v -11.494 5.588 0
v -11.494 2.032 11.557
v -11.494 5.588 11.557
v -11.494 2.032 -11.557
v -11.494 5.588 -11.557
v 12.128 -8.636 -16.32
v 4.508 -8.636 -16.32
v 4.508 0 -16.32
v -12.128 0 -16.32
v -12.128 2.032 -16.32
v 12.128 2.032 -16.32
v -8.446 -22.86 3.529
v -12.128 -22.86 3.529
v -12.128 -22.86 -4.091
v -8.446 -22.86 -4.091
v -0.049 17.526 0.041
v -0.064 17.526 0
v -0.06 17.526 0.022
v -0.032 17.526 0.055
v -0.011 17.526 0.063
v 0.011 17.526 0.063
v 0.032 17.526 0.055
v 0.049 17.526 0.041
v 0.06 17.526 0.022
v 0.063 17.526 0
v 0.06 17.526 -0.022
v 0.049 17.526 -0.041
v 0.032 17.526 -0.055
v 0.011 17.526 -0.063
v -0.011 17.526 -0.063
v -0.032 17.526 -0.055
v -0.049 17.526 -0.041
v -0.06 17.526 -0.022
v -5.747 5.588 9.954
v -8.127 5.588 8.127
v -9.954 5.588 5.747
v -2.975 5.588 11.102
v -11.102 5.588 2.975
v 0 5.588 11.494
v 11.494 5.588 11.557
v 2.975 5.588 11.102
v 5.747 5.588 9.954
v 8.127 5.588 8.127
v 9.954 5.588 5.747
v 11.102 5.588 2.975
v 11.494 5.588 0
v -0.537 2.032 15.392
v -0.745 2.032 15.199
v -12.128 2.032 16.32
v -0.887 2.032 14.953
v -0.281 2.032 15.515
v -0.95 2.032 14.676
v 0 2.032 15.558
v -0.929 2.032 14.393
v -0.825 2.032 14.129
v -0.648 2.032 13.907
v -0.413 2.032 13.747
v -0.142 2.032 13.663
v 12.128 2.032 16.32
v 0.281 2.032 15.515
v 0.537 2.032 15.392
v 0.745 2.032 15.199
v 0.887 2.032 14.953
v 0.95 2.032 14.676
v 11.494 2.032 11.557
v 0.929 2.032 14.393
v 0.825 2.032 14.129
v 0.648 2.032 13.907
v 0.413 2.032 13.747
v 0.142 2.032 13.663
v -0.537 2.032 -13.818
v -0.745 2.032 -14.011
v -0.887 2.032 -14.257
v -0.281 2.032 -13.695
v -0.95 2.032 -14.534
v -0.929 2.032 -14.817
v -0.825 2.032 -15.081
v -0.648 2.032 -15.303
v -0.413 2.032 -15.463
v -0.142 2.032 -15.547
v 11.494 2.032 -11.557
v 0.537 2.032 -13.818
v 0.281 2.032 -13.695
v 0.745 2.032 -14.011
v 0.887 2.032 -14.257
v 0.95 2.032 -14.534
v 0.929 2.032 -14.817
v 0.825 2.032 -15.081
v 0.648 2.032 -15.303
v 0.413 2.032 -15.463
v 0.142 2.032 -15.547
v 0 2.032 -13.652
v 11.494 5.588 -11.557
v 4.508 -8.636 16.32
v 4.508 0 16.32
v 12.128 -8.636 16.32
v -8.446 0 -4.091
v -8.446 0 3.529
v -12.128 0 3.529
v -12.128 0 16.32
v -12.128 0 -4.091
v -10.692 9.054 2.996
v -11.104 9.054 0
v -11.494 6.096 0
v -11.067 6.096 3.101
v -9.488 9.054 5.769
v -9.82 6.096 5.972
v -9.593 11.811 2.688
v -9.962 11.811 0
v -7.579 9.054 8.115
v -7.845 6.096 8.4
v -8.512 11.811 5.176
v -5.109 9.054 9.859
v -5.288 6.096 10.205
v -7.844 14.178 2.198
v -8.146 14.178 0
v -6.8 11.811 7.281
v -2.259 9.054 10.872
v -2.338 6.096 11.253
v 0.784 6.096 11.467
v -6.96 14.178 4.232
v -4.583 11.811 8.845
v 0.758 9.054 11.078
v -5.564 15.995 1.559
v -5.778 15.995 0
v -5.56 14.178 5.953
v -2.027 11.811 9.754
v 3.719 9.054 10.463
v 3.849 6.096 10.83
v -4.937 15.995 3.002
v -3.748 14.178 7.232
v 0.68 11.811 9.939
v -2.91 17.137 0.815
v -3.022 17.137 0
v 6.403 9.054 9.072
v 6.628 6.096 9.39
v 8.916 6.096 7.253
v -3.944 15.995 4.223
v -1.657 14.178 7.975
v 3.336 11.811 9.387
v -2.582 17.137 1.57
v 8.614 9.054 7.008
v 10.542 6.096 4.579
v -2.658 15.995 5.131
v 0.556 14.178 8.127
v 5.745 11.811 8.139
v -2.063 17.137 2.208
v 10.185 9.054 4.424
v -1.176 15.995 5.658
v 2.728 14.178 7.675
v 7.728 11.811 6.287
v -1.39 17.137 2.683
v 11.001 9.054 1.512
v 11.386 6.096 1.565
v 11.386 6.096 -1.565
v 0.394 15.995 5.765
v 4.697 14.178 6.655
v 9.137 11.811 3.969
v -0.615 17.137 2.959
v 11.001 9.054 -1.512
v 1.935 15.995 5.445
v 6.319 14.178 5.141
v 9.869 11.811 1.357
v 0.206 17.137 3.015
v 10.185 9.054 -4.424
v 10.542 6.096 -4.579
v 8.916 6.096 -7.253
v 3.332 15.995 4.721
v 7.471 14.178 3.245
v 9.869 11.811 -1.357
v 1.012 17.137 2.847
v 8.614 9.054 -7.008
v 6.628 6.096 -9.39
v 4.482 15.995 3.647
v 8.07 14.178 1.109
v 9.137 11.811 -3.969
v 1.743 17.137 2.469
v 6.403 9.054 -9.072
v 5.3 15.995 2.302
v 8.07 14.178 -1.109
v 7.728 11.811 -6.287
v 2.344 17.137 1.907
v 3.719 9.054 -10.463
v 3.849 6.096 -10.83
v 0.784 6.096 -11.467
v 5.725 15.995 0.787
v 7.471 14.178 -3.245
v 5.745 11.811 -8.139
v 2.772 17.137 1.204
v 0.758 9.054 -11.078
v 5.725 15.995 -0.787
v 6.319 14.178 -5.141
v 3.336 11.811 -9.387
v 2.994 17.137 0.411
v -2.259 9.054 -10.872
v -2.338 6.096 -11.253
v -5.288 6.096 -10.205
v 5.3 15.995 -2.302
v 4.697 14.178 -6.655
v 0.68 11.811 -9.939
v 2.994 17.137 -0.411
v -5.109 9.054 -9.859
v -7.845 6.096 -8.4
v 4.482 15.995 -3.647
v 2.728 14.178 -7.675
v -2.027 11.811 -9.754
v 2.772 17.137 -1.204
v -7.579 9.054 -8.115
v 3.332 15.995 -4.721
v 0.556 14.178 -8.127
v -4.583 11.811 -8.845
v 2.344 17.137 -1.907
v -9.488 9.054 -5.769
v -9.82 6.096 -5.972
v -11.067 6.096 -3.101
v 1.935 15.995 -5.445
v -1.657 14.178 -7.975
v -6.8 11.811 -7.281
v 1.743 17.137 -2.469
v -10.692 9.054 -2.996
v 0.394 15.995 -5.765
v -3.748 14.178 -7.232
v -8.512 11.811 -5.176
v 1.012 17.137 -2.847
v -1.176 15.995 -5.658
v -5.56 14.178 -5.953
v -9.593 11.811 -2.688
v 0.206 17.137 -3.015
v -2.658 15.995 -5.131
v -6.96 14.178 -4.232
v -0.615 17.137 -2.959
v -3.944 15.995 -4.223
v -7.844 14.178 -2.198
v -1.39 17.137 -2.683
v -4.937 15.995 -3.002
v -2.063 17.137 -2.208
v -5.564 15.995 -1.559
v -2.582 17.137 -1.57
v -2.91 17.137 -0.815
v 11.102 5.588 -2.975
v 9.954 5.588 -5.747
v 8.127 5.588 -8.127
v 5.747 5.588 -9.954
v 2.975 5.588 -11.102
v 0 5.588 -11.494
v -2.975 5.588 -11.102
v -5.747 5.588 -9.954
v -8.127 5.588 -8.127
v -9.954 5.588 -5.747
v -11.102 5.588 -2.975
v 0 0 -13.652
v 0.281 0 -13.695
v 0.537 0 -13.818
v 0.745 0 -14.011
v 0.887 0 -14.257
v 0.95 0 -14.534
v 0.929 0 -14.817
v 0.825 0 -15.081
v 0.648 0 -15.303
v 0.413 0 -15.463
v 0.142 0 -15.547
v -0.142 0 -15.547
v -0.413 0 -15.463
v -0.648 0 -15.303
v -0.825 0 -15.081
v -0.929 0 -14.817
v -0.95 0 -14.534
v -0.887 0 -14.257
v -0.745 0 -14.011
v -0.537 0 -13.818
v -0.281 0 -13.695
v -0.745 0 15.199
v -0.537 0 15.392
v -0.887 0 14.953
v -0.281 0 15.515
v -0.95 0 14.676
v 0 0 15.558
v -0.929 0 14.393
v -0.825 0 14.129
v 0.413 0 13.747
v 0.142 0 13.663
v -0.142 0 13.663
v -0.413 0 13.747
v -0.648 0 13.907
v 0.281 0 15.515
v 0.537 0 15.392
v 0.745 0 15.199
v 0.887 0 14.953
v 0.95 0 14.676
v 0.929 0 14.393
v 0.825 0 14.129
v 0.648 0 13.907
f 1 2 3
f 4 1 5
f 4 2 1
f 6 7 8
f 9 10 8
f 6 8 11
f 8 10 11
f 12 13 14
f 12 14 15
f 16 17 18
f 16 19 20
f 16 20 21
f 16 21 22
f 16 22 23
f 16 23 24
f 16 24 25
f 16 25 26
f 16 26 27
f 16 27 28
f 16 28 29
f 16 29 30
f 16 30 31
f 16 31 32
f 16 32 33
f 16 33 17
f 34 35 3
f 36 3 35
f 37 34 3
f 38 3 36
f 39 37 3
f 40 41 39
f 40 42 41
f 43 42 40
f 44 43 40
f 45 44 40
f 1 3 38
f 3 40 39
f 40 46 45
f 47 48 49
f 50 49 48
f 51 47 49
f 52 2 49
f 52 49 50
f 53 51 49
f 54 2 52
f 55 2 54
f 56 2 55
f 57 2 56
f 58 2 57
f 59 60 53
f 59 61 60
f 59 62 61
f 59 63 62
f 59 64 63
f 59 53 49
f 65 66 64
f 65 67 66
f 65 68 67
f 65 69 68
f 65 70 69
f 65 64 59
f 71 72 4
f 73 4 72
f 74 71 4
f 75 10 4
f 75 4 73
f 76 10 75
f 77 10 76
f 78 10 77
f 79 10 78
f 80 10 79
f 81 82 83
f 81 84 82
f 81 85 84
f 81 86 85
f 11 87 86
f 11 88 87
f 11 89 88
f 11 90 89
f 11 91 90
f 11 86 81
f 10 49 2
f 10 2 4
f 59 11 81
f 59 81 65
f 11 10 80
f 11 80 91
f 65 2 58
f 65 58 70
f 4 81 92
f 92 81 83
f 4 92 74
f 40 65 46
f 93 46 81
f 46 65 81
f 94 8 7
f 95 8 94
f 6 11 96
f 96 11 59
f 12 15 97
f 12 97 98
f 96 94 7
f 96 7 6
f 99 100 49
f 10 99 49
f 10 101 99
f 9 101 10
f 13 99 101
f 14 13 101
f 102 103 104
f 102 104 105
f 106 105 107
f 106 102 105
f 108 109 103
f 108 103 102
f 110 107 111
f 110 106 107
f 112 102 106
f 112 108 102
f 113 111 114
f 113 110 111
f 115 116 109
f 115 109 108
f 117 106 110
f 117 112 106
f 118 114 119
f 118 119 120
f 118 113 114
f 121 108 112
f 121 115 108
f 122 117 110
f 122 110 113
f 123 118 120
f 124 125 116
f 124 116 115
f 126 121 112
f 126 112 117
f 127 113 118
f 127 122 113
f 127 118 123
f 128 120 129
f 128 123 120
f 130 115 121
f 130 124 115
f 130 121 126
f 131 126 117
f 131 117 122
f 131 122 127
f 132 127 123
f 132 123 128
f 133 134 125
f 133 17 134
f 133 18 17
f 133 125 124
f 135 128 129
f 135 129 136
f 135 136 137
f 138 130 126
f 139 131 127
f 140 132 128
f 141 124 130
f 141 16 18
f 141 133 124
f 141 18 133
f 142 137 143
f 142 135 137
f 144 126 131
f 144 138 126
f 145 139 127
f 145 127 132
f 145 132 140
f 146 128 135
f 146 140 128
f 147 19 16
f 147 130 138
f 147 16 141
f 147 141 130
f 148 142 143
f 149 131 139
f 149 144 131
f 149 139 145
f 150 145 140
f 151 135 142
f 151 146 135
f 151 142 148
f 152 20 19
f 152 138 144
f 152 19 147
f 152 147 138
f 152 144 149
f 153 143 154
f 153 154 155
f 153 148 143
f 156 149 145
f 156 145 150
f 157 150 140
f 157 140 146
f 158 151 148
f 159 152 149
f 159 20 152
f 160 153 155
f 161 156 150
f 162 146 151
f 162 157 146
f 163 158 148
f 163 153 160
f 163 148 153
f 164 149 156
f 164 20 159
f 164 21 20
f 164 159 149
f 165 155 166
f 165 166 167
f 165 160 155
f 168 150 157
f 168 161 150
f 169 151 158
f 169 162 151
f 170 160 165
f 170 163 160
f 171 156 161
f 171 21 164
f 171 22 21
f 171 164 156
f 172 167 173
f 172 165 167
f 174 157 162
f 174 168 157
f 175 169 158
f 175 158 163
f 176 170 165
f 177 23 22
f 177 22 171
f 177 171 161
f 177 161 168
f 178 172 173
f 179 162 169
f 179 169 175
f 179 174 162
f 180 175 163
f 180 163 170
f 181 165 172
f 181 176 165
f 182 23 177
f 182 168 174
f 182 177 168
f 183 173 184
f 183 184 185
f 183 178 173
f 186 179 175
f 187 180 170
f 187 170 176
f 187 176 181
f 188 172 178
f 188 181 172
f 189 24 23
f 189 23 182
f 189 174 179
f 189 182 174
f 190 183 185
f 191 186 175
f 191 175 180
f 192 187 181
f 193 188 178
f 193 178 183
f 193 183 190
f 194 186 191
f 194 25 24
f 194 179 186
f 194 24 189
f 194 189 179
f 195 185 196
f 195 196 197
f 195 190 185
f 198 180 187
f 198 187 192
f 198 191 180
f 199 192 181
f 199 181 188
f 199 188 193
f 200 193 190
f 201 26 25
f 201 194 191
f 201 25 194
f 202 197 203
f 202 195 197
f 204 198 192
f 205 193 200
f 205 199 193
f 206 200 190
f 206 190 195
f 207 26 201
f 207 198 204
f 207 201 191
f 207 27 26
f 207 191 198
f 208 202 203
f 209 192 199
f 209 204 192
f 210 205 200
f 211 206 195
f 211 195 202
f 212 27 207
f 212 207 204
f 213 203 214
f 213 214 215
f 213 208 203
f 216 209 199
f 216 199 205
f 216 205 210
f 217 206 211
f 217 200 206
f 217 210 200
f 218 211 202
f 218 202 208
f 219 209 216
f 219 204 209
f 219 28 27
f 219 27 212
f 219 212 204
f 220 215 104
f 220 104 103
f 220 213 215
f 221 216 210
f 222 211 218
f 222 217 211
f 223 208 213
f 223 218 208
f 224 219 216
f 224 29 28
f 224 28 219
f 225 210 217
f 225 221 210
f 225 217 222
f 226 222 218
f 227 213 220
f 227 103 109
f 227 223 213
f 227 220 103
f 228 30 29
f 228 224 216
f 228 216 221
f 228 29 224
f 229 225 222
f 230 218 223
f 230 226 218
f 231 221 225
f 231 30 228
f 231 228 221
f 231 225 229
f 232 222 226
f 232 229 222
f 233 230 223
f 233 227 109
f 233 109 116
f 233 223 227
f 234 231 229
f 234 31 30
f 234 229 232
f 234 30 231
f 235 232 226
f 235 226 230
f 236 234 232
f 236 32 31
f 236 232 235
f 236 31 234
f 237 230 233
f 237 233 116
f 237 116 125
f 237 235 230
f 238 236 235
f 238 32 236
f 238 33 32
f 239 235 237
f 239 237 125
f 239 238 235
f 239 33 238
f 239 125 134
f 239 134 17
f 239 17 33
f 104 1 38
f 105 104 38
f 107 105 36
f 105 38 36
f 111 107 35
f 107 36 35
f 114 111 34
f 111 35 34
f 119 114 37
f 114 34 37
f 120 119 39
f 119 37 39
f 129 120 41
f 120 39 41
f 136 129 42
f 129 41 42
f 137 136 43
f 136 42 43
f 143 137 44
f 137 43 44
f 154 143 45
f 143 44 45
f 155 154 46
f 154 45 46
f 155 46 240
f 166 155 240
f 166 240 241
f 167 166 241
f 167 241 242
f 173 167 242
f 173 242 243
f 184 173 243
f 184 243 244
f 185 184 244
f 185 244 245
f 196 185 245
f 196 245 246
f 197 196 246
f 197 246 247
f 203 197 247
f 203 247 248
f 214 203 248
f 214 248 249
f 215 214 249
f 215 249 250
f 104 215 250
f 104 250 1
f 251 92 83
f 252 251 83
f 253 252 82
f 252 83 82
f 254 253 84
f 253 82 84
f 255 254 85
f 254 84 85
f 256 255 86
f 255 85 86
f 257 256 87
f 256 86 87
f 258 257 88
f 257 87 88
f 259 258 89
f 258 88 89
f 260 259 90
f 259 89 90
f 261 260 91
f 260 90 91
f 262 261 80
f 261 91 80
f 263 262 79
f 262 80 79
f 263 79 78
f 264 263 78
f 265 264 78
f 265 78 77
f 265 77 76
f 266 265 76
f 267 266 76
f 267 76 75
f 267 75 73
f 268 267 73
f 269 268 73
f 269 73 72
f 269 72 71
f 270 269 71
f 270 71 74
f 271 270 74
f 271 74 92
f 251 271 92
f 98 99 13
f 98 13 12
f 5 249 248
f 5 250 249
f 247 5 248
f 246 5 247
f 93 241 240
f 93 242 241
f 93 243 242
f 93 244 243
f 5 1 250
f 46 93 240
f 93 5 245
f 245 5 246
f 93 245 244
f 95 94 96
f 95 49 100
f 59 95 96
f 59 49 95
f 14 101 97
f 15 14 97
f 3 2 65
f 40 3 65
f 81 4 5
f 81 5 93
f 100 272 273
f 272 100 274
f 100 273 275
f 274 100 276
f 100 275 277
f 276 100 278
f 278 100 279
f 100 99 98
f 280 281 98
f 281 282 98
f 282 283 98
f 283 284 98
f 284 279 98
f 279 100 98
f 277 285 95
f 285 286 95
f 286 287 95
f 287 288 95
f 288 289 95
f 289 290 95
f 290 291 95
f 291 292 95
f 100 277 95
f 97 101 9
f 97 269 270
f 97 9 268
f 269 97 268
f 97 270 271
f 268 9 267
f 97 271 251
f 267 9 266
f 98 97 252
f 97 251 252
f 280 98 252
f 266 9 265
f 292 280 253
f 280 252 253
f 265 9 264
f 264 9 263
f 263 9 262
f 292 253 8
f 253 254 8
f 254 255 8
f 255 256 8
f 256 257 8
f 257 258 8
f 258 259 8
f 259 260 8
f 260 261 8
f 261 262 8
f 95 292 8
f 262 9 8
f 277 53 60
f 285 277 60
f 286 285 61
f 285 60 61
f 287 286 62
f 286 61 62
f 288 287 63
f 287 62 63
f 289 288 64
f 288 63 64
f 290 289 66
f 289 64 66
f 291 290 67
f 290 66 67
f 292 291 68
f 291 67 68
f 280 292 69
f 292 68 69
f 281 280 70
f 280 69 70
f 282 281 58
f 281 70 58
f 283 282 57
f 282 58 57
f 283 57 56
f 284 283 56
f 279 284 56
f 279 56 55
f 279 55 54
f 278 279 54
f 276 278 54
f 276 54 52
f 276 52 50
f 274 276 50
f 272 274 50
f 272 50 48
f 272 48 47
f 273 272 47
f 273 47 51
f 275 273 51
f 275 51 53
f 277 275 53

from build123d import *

# Parameters (mm, degrees)
SKETCH1_W           = 24.257
SKETCH1_H           = 32.639
BOSS_EXTRUDE1_DEPTH = 2.032
SKETCH2_R           = 0.9525
CUT_EXTRUDE1_DEPTH  = 2.4892
SKETCH3_W           = 22.987
SKETCH3_H           = 23.114
BOSS_EXTRUDE2_DEPTH = 3.556
SKETCH4_R           = 11.4935
BOSS_EXTRUDE3_DEPTH = 11.938
FILLET1_R           = 11.43
SKETCH5_W           = 7.62
SKETCH5_H           = 32.639
BOSS_EXTRUDE4_DEPTH = 8.636
SKETCH6_W           = 3.683
SKETCH6_H           = 7.62
BOSS_EXTRUDE5_DEPTH = 22.86


with BuildPart() as part:
    # Sketch1 → Boss-Extrude1 (new body)
    with BuildSketch(Plane(origin=(0, 0, 0), x_dir=(1, 0, 0), z_dir=(0, 1, 0))):
        Rectangle(SKETCH1_W, SKETCH1_H)
    extrude(amount=BOSS_EXTRUDE1_DEPTH)

    # Sketch2 → Cut-Extrude1 (cut)
    with BuildSketch(Plane(origin=(0, 2.032, 0), x_dir=(1, 0, 0), z_dir=(0, 1, 0))):
        with Locations(Location((0, 14.605, 0), (0, 0, 270))):
            Circle(SKETCH2_R)
        with Locations(Location((0, -14.605, 0), (0, 0, 270))):
            Circle(SKETCH2_R)
    extrude(amount=-CUT_EXTRUDE1_DEPTH, mode=Mode.SUBTRACT)

    # Sketch3 → Boss-Extrude2 (add)
    with BuildSketch(Plane(origin=(0, 2.032, 0), x_dir=(1, 0, 0), z_dir=(0, 1, 0))):
        Rectangle(SKETCH3_W, SKETCH3_H)
    extrude(amount=BOSS_EXTRUDE2_DEPTH)

    # Sketch4 → Boss-Extrude3 (add)
    with BuildSketch(Plane(origin=(0, 5.588, 0), x_dir=(1, 0, 0), z_dir=(0, 1, 0))):
        with Locations(Location((0, 0, 0), (0, 0, 180))):
            Circle(SKETCH4_R)
    extrude(amount=BOSS_EXTRUDE3_DEPTH)

    # Fillet1
    fillet1_edges = [part.edges().sort_by_distance(p)[0] for p in [
        (11.4935, 17.526, 0),
    ]]
    fillet(fillet1_edges, radius=FILLET1_R)

    # Sketch5 → Boss-Extrude4 (add)
    with BuildSketch(Plane.XZ):
        with Locations((8.3185, 0)):
            Rectangle(SKETCH5_W, SKETCH5_H)
    extrude(amount=BOSS_EXTRUDE4_DEPTH)

    # Sketch6 → Boss-Extrude5 (add)
    with BuildSketch(Plane.XZ):
        with Locations((-10.287, -0.28087532)):
            Rectangle(SKETCH6_W, SKETCH6_H)
    extrude(amount=BOSS_EXTRUDE5_DEPTH)


solid = part.part
